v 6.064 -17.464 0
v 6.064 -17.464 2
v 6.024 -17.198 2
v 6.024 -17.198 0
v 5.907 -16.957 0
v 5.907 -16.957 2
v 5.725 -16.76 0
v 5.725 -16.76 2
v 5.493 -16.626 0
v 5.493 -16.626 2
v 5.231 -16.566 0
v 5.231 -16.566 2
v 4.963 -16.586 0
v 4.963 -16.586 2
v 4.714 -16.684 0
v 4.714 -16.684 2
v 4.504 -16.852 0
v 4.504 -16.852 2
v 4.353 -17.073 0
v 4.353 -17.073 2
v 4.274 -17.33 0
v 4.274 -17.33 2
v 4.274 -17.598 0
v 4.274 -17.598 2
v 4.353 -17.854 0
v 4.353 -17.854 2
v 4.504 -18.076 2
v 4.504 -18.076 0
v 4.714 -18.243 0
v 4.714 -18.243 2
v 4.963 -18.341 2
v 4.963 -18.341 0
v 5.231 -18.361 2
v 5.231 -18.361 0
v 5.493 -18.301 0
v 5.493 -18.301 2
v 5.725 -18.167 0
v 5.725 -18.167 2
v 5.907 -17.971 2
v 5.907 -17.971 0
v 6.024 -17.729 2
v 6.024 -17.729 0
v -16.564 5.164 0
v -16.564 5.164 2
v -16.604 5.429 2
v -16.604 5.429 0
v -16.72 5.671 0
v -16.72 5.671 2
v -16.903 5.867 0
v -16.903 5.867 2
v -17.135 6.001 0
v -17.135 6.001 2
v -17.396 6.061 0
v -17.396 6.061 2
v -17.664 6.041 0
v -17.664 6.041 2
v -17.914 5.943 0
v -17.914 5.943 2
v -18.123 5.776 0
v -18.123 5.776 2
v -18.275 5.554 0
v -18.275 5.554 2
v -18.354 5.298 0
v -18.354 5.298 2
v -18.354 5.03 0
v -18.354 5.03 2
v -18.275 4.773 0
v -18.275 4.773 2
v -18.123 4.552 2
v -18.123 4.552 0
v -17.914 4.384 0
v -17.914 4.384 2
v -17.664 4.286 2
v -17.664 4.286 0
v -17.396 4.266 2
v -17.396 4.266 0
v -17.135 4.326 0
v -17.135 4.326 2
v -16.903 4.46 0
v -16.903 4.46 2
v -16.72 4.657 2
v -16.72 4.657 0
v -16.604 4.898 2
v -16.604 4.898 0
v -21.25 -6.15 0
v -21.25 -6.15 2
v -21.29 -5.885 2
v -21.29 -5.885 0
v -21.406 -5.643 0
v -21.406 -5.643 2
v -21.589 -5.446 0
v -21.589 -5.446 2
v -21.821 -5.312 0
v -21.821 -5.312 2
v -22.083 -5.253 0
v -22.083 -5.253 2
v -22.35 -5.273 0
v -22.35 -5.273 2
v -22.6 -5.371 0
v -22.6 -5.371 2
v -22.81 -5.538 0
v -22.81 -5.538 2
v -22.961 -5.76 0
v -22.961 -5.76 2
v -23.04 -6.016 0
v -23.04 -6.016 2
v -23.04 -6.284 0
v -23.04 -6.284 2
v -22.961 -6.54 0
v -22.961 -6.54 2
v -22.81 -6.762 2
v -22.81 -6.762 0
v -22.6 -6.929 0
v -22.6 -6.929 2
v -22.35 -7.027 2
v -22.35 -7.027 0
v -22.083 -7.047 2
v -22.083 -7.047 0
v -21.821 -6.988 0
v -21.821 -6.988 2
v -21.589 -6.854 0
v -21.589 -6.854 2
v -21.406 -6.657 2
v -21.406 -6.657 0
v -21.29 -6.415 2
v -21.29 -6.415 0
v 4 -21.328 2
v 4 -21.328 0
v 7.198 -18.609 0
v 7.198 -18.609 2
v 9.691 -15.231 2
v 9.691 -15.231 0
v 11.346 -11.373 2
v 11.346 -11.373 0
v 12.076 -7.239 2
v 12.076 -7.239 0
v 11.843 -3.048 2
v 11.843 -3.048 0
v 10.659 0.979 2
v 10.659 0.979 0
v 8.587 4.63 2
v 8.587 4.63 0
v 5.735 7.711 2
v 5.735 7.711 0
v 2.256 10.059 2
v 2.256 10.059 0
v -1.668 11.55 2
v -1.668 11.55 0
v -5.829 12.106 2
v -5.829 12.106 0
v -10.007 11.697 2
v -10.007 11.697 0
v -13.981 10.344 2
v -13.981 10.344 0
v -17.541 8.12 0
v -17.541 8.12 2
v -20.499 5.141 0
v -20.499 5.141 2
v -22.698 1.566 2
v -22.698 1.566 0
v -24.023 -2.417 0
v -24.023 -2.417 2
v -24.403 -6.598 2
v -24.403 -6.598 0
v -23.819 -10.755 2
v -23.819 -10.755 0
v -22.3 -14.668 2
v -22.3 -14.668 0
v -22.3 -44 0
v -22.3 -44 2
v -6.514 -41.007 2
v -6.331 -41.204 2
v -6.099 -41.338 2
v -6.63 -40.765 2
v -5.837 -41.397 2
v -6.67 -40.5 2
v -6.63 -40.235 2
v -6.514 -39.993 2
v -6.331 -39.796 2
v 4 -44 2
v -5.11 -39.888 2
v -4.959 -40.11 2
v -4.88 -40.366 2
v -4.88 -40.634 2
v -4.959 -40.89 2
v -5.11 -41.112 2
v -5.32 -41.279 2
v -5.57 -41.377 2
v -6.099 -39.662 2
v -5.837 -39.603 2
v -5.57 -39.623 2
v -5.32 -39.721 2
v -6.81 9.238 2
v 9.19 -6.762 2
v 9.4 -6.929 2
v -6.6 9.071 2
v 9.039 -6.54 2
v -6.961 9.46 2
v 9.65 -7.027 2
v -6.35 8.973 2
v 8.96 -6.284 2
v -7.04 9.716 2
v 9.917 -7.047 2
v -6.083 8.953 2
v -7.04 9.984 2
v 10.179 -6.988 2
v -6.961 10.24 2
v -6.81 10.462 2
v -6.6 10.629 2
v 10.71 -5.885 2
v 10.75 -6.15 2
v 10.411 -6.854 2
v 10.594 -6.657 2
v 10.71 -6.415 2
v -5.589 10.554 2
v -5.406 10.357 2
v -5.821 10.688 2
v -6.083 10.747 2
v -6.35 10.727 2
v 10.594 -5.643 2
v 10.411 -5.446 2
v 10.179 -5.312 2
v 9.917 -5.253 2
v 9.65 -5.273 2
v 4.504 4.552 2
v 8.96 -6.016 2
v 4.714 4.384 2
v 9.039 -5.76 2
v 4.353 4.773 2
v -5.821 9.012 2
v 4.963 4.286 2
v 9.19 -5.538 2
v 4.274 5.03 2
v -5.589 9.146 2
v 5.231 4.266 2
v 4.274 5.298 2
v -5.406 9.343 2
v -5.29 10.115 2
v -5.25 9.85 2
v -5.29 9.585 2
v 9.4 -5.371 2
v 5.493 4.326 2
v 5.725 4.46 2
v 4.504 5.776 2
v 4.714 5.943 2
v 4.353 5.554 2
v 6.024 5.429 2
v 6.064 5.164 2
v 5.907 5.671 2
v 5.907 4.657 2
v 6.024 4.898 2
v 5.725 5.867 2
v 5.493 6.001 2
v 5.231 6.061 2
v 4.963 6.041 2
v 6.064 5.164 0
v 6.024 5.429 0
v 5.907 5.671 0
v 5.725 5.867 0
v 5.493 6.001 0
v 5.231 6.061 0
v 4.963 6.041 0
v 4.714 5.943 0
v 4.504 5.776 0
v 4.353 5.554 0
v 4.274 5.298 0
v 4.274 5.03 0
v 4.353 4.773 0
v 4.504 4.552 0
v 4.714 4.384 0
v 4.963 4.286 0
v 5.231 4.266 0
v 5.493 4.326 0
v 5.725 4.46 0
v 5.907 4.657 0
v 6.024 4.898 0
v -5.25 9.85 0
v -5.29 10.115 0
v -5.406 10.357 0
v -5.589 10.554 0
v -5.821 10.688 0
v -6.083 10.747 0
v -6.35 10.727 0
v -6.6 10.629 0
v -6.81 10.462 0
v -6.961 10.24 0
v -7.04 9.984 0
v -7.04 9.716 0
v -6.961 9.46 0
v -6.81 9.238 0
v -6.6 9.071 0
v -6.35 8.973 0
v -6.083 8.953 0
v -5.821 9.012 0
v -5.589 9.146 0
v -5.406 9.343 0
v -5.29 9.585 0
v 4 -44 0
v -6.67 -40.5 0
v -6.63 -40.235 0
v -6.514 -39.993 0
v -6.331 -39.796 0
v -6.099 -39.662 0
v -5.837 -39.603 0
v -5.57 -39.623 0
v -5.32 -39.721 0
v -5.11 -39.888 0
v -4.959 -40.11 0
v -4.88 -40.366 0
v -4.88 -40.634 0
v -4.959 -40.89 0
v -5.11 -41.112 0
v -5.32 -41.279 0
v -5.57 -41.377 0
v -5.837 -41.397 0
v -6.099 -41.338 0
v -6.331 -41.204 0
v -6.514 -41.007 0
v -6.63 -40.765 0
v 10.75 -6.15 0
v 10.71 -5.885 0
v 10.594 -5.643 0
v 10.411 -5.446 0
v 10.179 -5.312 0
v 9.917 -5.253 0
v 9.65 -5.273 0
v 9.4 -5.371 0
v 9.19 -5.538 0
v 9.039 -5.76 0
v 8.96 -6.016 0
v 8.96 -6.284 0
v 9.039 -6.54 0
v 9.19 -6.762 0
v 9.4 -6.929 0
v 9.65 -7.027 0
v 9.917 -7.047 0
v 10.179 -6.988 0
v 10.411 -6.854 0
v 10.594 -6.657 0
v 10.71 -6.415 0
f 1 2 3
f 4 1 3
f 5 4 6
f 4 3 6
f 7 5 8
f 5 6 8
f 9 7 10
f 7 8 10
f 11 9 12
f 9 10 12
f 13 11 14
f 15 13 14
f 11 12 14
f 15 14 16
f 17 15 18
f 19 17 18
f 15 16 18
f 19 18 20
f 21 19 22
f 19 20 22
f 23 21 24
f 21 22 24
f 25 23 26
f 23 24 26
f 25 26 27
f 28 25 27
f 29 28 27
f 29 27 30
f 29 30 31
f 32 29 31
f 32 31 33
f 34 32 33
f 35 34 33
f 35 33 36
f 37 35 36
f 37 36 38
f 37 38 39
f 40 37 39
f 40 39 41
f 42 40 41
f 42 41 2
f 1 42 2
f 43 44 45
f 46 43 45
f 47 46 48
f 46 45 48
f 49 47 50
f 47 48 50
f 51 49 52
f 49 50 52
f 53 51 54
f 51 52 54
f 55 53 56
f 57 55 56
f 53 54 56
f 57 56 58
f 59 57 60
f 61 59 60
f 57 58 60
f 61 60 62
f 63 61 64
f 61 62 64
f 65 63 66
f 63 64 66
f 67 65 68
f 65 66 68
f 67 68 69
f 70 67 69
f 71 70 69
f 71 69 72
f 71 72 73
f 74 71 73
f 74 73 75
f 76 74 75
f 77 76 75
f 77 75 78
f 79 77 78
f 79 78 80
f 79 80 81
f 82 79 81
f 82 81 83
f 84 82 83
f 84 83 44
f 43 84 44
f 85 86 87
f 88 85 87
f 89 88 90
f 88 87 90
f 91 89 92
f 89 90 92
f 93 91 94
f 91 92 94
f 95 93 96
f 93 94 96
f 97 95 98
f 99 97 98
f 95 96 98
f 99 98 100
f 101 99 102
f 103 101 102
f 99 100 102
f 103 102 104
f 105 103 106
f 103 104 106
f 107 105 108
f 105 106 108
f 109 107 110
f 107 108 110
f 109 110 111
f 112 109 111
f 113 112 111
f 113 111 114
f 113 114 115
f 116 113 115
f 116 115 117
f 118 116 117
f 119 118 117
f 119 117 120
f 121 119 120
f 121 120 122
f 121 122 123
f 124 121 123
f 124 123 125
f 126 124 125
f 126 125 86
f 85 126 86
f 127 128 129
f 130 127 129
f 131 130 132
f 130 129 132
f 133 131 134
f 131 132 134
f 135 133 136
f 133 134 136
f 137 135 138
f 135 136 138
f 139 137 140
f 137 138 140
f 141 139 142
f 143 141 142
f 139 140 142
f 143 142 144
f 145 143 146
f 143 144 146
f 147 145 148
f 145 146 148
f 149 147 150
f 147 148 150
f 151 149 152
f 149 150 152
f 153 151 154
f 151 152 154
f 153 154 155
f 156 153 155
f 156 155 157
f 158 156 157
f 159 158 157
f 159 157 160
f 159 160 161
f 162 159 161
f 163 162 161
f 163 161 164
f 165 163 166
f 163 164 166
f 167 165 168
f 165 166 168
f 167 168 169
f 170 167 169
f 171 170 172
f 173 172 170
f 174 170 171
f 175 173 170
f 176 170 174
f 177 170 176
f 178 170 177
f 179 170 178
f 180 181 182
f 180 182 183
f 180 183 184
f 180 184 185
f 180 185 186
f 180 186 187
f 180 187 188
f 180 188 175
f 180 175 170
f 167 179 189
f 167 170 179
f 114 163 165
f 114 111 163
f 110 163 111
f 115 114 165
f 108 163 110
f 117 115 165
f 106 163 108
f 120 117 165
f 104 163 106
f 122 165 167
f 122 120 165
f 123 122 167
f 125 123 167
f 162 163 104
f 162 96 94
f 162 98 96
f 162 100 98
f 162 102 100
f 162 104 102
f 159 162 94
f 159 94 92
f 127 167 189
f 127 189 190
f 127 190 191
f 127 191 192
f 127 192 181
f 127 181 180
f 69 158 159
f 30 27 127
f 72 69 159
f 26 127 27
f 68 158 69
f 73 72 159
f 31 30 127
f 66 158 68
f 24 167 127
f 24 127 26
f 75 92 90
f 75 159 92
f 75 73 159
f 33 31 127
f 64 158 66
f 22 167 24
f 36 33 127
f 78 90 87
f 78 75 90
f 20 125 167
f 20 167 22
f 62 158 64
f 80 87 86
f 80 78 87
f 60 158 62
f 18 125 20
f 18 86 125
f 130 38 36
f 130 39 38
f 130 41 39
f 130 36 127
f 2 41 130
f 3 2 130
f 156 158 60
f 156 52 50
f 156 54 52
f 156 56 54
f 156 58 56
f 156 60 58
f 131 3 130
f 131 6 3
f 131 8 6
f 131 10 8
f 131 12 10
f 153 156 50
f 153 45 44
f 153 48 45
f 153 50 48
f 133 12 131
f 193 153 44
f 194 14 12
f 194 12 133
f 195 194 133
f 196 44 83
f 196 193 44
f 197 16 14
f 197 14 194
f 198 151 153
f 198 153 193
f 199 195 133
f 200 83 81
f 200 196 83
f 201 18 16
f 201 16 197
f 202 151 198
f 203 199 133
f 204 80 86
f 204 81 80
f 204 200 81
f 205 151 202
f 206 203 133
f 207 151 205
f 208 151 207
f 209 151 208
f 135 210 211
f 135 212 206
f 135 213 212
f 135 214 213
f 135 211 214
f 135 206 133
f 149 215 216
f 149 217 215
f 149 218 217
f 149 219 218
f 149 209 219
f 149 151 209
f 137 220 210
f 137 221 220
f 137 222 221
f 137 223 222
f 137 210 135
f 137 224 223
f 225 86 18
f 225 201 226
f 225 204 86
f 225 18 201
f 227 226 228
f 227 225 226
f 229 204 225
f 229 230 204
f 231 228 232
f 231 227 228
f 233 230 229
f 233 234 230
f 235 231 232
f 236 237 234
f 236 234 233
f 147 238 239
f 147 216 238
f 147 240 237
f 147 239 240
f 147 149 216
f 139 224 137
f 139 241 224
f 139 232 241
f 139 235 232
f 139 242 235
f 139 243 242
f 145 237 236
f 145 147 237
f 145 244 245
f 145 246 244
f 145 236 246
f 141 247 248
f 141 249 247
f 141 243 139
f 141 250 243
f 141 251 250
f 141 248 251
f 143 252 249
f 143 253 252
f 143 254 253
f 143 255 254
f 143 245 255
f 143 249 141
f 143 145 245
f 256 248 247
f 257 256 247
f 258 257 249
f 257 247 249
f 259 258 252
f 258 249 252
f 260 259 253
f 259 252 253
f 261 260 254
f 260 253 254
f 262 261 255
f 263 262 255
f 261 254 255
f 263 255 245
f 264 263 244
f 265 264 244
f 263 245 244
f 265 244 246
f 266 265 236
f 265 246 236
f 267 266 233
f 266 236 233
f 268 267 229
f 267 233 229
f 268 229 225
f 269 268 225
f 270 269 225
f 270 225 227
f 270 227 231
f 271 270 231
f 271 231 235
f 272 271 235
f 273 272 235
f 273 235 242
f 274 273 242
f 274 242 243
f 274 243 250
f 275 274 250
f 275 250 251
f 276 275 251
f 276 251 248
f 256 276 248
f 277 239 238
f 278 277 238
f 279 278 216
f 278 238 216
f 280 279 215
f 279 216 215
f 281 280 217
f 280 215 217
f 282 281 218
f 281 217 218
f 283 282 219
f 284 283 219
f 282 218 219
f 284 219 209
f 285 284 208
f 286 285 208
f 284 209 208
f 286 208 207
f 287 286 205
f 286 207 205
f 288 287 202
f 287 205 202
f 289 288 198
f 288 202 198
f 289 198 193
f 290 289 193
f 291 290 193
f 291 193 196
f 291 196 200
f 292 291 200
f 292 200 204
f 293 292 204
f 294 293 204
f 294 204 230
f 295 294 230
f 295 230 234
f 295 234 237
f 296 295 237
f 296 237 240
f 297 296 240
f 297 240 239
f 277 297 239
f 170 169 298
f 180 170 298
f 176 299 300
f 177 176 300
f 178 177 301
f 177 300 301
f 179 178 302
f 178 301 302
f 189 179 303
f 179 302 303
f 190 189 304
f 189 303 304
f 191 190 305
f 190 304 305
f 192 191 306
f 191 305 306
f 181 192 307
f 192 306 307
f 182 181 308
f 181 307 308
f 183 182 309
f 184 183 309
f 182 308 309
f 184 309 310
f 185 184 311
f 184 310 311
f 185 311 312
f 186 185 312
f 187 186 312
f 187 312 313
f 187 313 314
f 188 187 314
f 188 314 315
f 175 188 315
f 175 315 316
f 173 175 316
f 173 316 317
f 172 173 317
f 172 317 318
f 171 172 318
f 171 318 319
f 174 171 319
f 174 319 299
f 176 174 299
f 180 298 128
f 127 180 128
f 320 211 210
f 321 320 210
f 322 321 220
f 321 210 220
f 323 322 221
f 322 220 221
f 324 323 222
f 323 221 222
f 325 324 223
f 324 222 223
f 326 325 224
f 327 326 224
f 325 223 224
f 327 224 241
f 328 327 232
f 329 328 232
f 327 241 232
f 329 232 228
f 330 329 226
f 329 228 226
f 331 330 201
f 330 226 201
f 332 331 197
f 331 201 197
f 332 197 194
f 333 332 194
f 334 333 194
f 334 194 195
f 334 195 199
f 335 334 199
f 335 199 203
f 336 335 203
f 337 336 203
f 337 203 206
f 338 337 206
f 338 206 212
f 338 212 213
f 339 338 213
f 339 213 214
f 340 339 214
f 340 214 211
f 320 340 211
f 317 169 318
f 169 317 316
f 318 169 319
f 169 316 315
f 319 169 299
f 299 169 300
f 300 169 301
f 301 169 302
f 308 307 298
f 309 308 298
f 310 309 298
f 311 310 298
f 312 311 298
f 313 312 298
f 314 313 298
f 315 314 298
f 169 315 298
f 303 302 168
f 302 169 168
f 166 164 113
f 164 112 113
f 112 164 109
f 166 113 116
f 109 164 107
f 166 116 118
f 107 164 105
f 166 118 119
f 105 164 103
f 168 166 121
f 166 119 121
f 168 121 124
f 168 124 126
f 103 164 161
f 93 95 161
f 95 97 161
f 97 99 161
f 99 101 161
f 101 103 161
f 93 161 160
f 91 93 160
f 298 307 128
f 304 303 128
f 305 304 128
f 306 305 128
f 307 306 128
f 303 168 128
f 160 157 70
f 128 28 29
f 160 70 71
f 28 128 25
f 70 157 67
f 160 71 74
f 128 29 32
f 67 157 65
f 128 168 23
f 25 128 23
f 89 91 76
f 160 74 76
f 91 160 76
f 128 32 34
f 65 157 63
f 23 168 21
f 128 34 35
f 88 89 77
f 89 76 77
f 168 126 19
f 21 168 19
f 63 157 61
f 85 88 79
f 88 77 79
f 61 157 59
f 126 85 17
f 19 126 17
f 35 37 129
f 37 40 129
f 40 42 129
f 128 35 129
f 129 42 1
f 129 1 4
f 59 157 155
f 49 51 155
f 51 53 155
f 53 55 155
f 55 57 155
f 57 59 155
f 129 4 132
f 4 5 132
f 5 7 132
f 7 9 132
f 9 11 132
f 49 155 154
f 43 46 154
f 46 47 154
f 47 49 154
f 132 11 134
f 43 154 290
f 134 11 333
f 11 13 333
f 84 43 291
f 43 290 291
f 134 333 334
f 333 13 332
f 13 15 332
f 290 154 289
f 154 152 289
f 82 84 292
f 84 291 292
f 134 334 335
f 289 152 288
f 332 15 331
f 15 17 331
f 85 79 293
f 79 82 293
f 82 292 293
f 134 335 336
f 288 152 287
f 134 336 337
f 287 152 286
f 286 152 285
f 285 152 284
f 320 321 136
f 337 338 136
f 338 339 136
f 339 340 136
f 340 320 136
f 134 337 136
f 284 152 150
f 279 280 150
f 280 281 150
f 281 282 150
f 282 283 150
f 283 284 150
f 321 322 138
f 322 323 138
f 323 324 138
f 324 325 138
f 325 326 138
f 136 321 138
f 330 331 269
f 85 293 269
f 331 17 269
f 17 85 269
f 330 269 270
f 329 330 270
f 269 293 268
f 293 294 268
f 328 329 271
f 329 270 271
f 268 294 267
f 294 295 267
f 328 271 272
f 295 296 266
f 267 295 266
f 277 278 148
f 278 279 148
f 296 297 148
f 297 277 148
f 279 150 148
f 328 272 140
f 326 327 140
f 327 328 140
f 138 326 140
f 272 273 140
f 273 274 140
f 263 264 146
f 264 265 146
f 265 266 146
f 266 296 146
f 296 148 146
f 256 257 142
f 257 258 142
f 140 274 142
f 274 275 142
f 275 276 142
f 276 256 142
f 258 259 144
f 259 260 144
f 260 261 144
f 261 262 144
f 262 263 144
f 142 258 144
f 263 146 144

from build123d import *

# Parameters (mm, degrees)
BOSS_EXTRU_1_DEPTH      = 2
ESQUISSE2_R             = 0.9
ENL_V_MAT_EXTRU_1_DEPTH = 51.356664533
ESQUISSE3_R             = 0.9
ENL_V_MAT_EXTRU_2_DEPTH = 51.356664533


with BuildPart() as part:
    # Esquisse1 → Boss.-Extru.1 (new body)
    with BuildSketch(Plane.XY):
        with BuildLine():
            Line((-22.3, -14.668472775), (-22.3, -44))
            Line((-22.3, -44), (4, -44))
            Line((4, -44), (4, -21.327759335))
            ThreePointArc((4, -21.327759335), (-1.668200766, 11.550292485), (-22.3, -14.668472775))
        make_face()
    extrude(amount=BOSS_EXTRU_1_DEPTH)

    # Esquisse2 → Enlèv. mat.-Extru.1 (cut, through all)
    with BuildSketch(Plane.XY.offset(2)):
        with Locations((9.85, -6.15)):
            Circle(ESQUISSE2_R)
        with Locations((5.163708499, -17.463708499)):
            Circle(ESQUISSE2_R)
        with Locations((-22.15, -6.15)):
            Circle(ESQUISSE2_R)
        with Locations((-17.463708499, 5.163708499)):
            Circle(ESQUISSE2_R)
        with Locations((-6.15, 9.85)):
            Circle(ESQUISSE2_R)
        with Locations((5.163708499, 5.163708499)):
            Circle(ESQUISSE2_R)
    extrude(amount=-ENL_V_MAT_EXTRU_1_DEPTH, mode=Mode.SUBTRACT)

    # Esquisse3 → Enlèv. mat.-Extru.2 (cut, through all)
    with BuildSketch(Plane(origin=(0, 0, 0), x_dir=(-1, 0, 0), z_dir=(0, 0, -1))):
        with Locations((5.77, -40.5)):
            Circle(ESQUISSE3_R)
    extrude(amount=-ENL_V_MAT_EXTRU_2_DEPTH, mode=Mode.SUBTRACT)


solid = part.part
